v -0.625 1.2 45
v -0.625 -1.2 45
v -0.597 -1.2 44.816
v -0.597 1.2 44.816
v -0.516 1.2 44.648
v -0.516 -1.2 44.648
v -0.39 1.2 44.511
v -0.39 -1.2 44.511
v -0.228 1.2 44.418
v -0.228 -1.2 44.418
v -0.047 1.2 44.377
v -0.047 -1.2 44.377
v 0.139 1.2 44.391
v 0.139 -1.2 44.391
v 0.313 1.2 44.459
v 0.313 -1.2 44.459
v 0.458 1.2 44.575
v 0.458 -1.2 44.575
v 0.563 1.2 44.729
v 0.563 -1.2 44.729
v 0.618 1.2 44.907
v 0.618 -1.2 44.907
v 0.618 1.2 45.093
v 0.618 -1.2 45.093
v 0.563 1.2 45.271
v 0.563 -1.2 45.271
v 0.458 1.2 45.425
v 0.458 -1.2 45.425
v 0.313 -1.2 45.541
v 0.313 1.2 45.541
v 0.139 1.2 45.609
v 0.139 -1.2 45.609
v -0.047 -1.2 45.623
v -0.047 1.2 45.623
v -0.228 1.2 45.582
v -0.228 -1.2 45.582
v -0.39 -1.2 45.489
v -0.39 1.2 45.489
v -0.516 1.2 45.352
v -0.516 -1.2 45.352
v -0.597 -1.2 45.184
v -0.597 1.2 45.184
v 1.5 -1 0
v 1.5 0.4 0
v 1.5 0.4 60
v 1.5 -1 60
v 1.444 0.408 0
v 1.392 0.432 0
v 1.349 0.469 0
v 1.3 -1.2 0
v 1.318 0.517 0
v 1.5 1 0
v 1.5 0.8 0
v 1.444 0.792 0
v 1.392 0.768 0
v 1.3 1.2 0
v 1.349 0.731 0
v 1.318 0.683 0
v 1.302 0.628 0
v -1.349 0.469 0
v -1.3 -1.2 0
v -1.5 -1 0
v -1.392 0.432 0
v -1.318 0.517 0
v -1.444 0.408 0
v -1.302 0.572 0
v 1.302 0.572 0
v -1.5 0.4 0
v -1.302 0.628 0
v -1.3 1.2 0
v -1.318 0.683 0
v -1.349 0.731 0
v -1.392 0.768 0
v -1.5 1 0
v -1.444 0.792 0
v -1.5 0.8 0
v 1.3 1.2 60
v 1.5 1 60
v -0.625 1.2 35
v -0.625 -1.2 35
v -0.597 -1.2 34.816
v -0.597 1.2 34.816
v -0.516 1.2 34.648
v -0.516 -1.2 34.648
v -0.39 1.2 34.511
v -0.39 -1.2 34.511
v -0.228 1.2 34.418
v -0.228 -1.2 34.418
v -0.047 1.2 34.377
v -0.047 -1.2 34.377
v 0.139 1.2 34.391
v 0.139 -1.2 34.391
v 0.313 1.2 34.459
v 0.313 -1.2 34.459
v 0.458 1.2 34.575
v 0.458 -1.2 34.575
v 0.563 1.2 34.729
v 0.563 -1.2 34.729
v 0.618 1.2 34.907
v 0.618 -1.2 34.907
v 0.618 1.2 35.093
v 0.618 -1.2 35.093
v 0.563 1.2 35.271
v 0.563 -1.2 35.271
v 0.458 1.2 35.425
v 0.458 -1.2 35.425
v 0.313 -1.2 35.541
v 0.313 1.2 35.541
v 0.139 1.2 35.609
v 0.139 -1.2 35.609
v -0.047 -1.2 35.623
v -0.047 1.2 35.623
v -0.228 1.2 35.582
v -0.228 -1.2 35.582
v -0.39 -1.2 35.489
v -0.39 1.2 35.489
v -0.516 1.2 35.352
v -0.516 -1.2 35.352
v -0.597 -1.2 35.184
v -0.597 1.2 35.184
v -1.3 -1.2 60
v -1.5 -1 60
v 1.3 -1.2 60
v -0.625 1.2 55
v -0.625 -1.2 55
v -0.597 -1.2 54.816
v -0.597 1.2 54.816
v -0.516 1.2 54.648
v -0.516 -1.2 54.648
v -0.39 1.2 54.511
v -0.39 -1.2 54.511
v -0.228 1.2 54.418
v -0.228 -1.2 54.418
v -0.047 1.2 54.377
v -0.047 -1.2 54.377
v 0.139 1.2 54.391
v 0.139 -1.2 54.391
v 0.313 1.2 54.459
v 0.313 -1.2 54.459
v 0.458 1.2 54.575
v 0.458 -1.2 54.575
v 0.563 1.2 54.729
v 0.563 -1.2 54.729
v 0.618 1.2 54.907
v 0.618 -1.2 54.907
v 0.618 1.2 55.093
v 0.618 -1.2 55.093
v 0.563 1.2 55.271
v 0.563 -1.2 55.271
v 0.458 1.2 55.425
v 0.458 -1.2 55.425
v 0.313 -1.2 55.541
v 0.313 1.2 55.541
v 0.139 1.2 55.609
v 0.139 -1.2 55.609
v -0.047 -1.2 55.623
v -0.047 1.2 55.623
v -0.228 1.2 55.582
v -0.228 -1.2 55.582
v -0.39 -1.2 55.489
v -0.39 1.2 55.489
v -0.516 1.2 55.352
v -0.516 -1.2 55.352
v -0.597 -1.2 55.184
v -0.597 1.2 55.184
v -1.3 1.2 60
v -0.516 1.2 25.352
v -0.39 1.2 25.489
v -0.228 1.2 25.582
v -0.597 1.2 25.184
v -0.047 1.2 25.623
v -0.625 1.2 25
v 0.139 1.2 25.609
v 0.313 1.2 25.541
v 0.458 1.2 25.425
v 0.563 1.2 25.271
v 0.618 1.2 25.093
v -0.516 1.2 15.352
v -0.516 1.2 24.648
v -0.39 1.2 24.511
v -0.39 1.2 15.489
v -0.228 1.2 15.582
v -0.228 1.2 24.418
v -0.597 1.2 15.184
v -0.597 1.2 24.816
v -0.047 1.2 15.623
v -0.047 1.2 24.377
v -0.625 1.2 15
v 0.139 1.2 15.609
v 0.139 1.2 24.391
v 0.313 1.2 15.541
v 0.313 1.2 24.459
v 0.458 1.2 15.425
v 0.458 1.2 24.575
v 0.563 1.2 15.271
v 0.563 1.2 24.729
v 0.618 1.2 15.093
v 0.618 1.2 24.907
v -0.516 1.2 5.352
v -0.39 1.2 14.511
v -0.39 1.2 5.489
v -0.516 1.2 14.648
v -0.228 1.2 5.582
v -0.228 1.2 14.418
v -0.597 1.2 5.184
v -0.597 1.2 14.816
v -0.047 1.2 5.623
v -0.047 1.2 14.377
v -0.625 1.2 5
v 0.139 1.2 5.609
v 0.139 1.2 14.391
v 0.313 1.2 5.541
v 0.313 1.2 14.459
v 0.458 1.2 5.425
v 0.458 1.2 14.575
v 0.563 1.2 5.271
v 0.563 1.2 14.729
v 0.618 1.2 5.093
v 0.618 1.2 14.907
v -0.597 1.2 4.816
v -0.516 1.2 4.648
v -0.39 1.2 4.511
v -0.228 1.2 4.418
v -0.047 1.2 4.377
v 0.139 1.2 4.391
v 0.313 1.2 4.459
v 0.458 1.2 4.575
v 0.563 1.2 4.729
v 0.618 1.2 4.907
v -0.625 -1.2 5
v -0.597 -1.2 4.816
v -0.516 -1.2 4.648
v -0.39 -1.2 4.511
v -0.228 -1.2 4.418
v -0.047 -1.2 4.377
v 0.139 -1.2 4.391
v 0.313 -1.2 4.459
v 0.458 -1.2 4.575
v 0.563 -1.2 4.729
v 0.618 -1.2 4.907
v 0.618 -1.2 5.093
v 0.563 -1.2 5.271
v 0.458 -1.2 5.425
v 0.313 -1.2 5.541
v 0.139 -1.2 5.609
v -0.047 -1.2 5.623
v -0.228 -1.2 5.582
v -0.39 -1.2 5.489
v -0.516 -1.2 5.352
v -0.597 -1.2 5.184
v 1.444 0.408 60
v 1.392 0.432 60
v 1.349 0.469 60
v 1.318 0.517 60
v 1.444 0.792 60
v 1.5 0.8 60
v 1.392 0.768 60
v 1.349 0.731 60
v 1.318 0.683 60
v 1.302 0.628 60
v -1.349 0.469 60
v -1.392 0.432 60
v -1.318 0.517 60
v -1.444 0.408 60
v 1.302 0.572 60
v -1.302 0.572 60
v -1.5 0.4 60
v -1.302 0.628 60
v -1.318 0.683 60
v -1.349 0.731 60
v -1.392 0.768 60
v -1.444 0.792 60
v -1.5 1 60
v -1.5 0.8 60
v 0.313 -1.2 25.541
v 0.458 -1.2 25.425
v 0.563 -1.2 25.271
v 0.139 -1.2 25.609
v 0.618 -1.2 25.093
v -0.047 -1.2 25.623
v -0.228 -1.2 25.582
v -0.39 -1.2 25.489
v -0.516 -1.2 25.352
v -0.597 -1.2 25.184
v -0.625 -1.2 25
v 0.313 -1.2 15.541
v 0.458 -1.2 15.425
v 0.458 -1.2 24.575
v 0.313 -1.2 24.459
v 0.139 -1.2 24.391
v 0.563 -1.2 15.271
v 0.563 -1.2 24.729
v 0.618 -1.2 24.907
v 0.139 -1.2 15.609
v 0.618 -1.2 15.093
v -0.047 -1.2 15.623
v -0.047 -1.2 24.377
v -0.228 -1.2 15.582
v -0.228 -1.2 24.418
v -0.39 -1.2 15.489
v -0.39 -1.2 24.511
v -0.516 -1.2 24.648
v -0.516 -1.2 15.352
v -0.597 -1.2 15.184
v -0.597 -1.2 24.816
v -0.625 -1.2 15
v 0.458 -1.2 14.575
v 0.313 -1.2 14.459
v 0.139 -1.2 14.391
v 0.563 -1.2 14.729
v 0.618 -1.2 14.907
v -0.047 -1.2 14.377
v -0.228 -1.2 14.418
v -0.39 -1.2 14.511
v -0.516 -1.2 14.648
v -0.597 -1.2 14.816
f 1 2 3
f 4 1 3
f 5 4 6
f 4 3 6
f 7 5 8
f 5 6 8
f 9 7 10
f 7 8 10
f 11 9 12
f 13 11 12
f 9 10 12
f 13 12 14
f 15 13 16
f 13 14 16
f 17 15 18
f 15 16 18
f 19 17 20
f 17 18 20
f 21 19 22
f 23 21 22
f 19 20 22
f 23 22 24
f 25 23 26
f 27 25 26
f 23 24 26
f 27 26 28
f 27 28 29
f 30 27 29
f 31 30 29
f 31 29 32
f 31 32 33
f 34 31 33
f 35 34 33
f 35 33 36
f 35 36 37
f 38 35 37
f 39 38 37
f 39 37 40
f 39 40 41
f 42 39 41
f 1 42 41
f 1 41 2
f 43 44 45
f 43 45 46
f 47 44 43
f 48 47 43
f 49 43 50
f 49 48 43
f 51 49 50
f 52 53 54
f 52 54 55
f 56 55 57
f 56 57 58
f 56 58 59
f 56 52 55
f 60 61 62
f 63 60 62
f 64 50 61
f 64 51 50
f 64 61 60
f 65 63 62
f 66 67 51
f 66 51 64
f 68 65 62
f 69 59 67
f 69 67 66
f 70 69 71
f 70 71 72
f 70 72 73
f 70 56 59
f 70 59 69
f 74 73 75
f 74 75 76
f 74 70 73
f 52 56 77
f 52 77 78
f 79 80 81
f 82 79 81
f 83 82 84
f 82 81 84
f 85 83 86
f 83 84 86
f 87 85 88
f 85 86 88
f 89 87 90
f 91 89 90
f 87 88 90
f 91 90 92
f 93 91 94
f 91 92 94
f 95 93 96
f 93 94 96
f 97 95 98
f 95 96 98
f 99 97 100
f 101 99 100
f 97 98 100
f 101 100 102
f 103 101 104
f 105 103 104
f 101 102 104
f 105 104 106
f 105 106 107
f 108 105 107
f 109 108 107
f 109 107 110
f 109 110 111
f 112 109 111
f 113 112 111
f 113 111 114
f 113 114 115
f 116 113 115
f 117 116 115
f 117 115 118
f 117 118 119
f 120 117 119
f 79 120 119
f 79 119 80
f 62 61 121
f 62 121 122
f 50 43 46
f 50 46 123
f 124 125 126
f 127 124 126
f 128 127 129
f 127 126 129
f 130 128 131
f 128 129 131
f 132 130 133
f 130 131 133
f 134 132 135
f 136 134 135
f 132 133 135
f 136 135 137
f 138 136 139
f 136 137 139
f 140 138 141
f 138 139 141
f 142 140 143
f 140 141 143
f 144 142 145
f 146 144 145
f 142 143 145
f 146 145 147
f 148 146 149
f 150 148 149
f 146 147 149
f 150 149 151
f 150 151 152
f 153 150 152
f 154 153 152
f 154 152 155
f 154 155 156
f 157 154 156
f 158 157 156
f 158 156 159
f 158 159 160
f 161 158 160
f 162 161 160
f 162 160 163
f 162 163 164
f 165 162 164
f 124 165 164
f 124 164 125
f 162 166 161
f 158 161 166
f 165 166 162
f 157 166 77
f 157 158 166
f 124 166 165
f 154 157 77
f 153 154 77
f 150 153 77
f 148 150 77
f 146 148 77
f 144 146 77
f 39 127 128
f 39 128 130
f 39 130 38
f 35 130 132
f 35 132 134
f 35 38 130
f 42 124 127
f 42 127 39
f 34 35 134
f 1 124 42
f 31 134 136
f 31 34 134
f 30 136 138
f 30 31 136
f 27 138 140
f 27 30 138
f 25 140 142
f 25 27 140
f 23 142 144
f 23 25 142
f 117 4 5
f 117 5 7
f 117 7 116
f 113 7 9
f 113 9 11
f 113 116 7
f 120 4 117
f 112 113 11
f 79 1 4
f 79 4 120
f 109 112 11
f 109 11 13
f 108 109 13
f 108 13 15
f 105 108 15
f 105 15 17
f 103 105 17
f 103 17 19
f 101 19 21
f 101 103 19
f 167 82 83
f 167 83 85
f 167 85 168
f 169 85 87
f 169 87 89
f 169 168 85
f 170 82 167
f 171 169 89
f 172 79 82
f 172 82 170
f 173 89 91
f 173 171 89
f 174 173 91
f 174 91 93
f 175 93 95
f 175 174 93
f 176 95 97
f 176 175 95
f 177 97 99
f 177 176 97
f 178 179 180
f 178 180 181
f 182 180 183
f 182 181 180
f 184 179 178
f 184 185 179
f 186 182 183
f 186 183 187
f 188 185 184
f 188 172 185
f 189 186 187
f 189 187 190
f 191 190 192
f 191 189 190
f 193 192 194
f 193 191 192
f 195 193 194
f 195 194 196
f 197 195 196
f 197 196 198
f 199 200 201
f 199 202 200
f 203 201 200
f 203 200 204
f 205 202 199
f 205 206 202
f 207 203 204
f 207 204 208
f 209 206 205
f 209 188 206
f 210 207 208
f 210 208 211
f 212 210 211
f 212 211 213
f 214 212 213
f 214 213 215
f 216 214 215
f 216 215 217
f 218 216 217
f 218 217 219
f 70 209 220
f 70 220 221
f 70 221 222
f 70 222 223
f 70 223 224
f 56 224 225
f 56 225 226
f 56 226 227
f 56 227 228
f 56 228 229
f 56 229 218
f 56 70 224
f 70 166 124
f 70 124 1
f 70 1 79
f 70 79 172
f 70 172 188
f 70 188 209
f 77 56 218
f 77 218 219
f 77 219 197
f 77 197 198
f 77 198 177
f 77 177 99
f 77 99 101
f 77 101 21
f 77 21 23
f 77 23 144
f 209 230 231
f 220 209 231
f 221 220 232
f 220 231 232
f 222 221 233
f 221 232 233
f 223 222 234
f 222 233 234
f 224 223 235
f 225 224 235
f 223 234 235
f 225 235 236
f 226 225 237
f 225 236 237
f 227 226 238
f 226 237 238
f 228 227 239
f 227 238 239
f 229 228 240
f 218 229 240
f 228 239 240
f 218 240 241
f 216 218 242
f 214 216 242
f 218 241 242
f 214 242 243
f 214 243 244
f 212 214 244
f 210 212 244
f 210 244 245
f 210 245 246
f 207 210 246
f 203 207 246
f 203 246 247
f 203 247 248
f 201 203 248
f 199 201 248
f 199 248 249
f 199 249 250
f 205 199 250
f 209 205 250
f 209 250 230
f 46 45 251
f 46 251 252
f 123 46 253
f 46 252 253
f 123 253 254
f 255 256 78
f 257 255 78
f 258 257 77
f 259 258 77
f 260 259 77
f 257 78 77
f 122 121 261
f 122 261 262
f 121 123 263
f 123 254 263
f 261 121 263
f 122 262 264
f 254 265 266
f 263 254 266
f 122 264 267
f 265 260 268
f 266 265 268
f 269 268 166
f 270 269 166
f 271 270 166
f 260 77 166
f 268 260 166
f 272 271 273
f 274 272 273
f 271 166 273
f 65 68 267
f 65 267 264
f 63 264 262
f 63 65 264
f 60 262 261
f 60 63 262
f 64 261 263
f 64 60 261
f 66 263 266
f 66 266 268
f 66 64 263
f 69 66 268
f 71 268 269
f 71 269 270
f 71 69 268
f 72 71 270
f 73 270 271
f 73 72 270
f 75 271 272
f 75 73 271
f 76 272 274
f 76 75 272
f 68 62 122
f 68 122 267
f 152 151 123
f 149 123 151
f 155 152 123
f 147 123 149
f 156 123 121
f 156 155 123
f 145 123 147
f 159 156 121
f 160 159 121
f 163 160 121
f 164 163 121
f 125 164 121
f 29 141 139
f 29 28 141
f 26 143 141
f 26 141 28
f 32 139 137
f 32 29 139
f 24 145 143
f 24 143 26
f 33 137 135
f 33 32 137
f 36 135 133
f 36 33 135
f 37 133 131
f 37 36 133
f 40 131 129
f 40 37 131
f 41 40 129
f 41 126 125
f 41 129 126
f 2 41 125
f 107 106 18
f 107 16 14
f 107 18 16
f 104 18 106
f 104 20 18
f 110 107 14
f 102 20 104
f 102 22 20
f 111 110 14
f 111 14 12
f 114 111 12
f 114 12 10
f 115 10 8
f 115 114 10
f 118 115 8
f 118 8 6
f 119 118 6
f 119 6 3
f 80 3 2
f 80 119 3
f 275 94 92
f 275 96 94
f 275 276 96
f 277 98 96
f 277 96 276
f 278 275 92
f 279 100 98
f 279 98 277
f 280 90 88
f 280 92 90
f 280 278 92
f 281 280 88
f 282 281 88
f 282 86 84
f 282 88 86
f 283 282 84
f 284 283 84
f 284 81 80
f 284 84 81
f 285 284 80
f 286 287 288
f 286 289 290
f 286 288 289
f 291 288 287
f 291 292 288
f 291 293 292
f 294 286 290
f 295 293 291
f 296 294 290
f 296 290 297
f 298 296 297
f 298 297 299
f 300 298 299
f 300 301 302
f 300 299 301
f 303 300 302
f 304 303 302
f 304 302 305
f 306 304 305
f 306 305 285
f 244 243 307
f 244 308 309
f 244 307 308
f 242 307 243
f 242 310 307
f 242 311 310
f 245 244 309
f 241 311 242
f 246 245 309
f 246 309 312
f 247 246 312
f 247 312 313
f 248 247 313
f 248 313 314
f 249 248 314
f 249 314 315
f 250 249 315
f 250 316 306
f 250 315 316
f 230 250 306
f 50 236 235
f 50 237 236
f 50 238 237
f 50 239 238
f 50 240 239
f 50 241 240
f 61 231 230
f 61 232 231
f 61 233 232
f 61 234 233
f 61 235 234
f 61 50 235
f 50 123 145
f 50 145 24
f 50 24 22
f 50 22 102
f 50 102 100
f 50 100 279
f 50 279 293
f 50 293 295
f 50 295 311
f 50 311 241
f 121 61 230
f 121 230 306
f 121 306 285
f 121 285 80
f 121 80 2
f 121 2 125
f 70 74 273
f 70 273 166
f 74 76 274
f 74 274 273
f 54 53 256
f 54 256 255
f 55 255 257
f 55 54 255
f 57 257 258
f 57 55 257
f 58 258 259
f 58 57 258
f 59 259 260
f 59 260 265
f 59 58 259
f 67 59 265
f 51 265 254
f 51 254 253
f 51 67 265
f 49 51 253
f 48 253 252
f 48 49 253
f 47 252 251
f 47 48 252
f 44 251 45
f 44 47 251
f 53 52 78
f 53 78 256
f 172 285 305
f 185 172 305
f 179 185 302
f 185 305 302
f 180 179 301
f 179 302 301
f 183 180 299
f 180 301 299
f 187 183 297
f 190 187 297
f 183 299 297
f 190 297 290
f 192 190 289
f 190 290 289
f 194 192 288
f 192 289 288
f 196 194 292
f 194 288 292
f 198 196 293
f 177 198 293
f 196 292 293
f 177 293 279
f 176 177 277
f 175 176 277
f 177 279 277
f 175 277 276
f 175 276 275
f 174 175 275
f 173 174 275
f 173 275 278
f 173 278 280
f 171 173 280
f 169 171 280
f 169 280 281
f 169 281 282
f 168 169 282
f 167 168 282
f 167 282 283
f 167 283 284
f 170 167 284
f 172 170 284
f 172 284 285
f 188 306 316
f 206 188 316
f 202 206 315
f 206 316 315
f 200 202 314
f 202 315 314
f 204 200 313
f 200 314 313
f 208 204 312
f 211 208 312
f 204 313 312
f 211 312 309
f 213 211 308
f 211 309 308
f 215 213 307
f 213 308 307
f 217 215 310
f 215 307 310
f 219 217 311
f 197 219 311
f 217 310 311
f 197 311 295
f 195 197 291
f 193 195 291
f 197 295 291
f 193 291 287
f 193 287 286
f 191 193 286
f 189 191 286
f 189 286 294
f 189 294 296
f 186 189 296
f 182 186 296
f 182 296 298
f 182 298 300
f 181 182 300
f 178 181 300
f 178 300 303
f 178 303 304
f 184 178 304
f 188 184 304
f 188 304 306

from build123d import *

# Parameters (mm, degrees)
BOSS_EXTRUDE1_DEPTH          = 60
M1_6X0_35_TAPPED_HOLE1_D     = 1.25
M1_6X0_35_TAPPED_HOLE1_DEPTH = 2.4
LPATTERN1_COUNT              = 6
LPATTERN1_PITCH              = 10


with BuildPart() as part:
    # Sketch1 → Boss-Extrude1 (new body)
    with BuildSketch(Plane.XY):
        with BuildLine():
            Line((-1.5, 1), (-1.3, 1.2))
            Line((-1.3, 1.2), (1.3, 1.2))
            Line((1.3, 1.2), (1.5, 1))
            Line((1.5, 1), (1.5, 0.8))
            ThreePointArc((1.5, 0.8), (1.3, 0.6), (1.5, 0.4))
            Line((1.5, 0.4), (1.5, -1))
            Line((1.5, -1), (1.3, -1.2))
            Line((1.3, -1.2), (-1.3, -1.2))
            Line((-1.3, -1.2), (-1.5, -1))
            Line((-1.5, -1), (-1.5, 0.4))
            ThreePointArc((-1.5, 0.4), (-1.3, 0.6), (-1.5, 0.8))
            Line((-1.5, 0.8), (-1.5, 1))
        make_face()
    extrude(amount=BOSS_EXTRUDE1_DEPTH)

    # M1.6x0.35 Tapped Hole1
    with Locations(Plane(origin=(0, 1.2, 0), x_dir=(1, 0, 0), z_dir=(0, 1, 0))):
        with Locations((0, -5)):
            m1_6x0_35_tapped_hole1 = Hole(M1_6X0_35_TAPPED_HOLE1_D / 2, depth=M1_6X0_35_TAPPED_HOLE1_DEPTH)

    # LPattern1: M1.6x0.35 Tapped Hole1 ×6
    with Locations(*[(0, 0, i * LPATTERN1_PITCH) for i in range(1, LPATTERN1_COUNT)]):
        add(m1_6x0_35_tapped_hole1, mode=Mode.SUBTRACT)


solid = part.part
